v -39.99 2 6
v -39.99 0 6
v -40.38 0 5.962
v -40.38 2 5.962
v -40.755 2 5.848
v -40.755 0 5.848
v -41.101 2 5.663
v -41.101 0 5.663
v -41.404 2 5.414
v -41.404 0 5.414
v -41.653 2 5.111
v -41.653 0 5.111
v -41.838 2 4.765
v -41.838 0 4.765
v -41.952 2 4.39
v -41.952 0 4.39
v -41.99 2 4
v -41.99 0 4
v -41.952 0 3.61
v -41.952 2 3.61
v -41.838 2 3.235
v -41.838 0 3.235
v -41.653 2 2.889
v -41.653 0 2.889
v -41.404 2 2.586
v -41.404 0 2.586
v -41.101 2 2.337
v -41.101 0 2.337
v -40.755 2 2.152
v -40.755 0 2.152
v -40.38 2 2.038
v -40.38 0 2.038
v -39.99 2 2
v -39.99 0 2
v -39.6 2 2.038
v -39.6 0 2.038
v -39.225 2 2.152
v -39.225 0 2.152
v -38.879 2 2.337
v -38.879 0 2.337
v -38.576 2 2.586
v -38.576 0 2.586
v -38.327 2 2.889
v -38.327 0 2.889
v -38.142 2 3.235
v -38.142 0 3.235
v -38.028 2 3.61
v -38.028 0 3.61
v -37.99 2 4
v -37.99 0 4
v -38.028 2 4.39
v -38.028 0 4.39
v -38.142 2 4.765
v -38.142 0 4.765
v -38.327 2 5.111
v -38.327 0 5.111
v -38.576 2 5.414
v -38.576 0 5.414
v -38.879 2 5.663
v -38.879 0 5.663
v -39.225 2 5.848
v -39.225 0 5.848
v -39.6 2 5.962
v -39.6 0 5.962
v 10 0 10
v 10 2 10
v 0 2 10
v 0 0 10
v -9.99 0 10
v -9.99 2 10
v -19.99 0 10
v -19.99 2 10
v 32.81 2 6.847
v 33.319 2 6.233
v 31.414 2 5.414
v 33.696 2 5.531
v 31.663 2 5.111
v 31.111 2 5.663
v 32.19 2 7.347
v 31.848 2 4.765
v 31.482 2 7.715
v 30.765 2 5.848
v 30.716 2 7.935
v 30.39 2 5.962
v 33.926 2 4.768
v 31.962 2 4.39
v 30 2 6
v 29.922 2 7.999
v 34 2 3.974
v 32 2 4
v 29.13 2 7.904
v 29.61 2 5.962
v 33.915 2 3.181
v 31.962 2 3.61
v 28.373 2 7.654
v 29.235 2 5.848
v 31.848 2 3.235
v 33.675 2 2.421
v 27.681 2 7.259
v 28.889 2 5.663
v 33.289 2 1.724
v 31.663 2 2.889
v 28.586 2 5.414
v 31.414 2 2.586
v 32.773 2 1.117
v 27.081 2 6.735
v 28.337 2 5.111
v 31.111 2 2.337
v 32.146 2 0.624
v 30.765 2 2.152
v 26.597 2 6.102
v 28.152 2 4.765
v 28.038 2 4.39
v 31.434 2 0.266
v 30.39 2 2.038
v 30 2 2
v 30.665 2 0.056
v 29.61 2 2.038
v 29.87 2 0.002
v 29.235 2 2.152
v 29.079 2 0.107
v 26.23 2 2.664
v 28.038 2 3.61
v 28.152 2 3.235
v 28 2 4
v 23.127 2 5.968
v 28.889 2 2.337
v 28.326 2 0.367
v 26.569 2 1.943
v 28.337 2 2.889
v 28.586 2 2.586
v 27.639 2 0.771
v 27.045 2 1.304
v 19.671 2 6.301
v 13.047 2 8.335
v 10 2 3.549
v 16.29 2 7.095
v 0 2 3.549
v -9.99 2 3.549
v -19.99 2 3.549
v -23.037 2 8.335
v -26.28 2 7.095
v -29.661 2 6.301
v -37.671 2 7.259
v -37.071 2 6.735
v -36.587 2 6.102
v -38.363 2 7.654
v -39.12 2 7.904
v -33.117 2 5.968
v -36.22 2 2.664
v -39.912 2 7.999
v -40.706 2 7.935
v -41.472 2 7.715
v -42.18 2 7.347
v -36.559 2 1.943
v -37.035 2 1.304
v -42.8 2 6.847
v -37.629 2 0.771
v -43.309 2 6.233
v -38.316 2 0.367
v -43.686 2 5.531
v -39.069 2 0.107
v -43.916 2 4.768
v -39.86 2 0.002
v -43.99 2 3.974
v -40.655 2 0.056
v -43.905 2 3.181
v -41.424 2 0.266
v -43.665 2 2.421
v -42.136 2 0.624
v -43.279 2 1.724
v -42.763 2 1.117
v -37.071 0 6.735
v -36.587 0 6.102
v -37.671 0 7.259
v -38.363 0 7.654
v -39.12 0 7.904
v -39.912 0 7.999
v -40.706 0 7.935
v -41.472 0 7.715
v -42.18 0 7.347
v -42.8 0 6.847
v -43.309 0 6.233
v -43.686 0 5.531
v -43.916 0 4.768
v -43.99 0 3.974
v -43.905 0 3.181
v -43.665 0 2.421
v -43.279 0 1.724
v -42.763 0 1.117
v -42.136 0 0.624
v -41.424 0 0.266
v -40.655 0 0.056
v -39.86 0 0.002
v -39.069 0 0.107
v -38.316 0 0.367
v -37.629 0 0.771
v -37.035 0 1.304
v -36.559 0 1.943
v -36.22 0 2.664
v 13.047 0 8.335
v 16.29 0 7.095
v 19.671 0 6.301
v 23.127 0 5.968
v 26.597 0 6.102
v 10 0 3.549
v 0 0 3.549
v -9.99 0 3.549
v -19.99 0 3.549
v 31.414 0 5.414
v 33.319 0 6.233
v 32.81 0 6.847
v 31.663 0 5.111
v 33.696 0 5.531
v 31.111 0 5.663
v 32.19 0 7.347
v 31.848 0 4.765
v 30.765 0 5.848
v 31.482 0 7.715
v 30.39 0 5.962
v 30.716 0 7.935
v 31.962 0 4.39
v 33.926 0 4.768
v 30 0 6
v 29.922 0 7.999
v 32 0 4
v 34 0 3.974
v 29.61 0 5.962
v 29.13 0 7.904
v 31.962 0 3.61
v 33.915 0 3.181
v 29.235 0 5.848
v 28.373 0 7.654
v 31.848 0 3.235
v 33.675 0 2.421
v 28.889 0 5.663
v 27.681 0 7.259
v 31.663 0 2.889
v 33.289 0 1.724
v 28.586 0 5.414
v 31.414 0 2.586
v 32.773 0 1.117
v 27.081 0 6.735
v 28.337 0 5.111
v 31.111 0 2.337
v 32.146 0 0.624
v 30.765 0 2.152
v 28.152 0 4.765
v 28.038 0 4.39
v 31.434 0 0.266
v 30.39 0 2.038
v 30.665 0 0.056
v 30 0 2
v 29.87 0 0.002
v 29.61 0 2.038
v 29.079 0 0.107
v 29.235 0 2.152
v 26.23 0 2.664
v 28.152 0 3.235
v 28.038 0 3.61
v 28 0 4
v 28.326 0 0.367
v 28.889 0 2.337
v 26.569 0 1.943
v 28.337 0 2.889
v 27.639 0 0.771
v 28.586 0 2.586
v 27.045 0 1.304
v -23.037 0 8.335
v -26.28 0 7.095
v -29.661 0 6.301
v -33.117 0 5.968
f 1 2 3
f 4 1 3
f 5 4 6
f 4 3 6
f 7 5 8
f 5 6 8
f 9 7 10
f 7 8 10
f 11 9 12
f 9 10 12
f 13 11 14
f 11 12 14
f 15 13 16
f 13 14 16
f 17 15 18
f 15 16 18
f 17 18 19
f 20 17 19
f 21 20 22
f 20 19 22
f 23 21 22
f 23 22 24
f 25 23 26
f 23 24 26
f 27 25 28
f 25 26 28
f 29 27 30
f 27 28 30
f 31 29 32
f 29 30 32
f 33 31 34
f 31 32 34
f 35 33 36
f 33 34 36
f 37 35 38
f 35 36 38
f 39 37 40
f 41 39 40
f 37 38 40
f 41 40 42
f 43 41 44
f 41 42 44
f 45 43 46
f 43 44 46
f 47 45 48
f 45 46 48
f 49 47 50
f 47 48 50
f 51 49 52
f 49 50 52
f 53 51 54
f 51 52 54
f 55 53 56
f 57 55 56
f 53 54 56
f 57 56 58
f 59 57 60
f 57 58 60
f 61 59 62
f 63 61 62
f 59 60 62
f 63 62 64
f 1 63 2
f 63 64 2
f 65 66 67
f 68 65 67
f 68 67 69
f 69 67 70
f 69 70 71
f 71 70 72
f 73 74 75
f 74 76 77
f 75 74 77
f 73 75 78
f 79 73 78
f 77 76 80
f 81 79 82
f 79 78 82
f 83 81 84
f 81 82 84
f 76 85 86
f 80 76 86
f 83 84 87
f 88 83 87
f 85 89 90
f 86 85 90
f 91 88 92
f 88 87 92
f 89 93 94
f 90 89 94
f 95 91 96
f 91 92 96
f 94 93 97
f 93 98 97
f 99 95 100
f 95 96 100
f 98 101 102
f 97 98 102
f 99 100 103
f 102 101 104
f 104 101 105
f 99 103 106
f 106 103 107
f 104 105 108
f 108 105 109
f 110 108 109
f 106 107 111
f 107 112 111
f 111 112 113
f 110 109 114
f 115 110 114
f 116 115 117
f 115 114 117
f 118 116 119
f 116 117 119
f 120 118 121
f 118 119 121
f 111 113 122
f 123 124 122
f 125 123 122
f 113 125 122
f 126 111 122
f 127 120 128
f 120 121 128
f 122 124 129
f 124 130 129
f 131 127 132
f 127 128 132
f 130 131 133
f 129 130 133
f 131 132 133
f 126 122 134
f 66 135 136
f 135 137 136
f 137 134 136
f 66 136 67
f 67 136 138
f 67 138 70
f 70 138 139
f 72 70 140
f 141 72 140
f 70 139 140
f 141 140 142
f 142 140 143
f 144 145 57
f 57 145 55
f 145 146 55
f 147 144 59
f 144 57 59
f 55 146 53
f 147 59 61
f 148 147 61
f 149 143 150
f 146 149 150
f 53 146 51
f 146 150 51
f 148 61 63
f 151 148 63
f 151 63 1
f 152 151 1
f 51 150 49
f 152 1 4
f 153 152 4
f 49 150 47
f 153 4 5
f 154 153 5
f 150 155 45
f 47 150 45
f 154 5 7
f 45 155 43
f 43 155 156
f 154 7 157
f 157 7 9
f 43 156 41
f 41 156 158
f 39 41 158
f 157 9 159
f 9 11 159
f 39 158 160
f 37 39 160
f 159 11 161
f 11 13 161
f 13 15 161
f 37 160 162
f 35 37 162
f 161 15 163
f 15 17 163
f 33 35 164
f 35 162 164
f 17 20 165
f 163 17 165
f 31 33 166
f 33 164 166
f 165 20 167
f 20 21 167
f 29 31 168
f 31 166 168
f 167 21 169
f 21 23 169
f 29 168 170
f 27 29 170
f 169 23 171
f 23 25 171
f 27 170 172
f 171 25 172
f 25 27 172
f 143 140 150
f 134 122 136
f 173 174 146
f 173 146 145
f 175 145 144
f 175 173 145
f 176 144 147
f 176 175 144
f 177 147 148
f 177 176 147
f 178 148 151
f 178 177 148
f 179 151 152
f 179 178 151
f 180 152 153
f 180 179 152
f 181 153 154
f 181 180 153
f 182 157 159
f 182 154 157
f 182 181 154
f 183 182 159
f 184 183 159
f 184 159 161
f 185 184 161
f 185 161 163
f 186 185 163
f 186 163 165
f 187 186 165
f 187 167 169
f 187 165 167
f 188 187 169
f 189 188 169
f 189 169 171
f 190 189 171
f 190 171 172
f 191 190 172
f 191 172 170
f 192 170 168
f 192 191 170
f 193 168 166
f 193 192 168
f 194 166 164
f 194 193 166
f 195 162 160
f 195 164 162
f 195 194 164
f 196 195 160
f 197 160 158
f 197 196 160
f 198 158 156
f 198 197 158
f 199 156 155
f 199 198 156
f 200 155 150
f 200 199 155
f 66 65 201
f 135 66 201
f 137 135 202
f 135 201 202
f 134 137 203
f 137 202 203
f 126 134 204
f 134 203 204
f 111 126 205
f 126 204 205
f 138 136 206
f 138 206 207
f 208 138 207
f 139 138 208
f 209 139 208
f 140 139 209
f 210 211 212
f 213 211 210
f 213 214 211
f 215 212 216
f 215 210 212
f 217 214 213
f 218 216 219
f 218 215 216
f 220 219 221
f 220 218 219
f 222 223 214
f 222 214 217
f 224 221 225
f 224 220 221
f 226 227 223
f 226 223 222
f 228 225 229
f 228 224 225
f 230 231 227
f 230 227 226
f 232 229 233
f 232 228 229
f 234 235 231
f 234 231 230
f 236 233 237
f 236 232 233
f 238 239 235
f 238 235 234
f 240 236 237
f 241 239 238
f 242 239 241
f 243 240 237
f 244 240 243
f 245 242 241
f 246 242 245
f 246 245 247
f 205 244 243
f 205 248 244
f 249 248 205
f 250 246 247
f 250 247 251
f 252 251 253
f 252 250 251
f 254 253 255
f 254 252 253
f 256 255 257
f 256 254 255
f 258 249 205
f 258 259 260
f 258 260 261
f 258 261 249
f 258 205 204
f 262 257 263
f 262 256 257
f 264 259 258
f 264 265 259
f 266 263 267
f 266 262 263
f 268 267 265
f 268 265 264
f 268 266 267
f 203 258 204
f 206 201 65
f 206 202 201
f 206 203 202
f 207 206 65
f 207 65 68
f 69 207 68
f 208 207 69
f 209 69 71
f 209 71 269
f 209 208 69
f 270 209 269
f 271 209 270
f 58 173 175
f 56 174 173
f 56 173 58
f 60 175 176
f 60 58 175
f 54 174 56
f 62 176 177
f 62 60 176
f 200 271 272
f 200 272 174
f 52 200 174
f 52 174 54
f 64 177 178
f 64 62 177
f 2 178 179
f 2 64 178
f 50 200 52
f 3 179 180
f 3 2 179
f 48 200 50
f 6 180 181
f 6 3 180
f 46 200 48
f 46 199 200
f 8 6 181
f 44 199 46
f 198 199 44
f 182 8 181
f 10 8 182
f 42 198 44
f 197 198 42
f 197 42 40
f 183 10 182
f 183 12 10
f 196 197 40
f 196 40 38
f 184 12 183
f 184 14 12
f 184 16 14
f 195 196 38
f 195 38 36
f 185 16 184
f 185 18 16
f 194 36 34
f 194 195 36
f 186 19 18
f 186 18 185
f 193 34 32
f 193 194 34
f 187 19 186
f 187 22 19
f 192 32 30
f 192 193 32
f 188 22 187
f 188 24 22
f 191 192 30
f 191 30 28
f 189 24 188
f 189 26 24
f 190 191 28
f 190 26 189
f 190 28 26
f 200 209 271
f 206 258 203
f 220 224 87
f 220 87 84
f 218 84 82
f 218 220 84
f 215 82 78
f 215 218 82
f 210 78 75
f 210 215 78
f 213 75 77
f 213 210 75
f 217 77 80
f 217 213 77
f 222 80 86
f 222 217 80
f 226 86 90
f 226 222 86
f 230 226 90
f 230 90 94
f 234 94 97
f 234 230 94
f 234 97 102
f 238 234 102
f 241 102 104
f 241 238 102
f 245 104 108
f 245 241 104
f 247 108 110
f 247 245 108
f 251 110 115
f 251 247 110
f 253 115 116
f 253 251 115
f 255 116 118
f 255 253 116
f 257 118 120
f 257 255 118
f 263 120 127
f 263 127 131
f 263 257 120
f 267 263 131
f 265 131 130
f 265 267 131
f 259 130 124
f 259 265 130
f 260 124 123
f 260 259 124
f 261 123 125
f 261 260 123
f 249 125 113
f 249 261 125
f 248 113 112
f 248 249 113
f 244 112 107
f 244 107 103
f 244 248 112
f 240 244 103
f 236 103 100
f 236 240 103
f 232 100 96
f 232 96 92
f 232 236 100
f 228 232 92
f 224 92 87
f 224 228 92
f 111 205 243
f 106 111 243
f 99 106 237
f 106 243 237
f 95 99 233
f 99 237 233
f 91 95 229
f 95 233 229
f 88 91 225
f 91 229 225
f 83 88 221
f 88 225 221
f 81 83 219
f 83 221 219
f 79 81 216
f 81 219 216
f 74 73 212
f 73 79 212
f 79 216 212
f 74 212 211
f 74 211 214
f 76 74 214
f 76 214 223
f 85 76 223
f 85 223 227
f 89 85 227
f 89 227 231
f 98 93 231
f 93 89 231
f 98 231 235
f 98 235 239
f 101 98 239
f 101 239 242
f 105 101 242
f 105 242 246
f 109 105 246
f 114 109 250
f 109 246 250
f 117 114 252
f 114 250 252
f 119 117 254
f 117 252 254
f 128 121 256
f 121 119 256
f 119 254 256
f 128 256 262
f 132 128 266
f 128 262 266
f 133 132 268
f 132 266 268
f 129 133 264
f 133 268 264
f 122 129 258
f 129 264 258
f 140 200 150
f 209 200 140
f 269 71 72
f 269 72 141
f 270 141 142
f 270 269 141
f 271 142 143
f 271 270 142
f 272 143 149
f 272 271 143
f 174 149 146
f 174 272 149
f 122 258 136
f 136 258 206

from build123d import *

# Parameters (mm, degrees)
SKETCH1_R           = 4
SKETCH1_R_2         = 2
BOSS_EXTRUDE1_DEPTH = 2
SKETCH3_W           = 40.799195599
SKETCH3_H           = 10.791683918
CUT_EXTRUDE1_DEPTH  = 10
SKETCH4_W           = 4.995
SKETCH4_H           = 6.450932821
BOSS_EXTRUDE2_DEPTH = 2


with BuildPart() as part:
    # Sketch1 → Boss-Extrude1 (new body)
    # profile 1 of 3: a face of its own
    with BuildSketch(Plane(origin=(0, 0, 0), x_dir=(1, 0, 0), z_dir=(0, 1, 0))):
        with BuildLine():
            ThreePointArc((26.59659241, -6.101622416), (26.022594709, -4.424555239), (26.229666852, -2.664115292))
            Line((26.229666852, -2.664115292), (10, -3.549067179))
            Line((10, -3.549067179), (-10, -3.549067179))
            Line((-10, -3.549067179), (-26.229666852, -2.664115292))
            ThreePointArc((-26.229666852, -2.664115292), (-26.057834821, -3.32225838), (-26, -4))
            ThreePointArc((-26, -4), (-26.152037529, -5.092329996), (-26.59659241, -6.101622416))
            ThreePointArc((-26.59659241, -6.101622416), (-17.96712489, -6.640913059), (-10, -10))
            Line((-10, -10), (10, -10))
            ThreePointArc((10, -10), (17.96712489, -6.640913059), (26.59659241, -6.101622416))
        make_face()
    # profile 2 of 3: a face of its own
    with BuildSketch(Plane(origin=(0, 0, 0), x_dir=(1, 0, 0), z_dir=(0, 1, 0))):
        with Locations((-30, -4)):
            Circle(SKETCH1_R)
        with Locations(Location((-30, -4, 0), (0, 0, 270))):
            Circle(SKETCH1_R_2, mode=Mode.SUBTRACT)
    # profile 3 of 3: a face of its own
    with BuildSketch(Plane(origin=(0, 0, 0), x_dir=(1, 0, 0), z_dir=(0, 1, 0))):
        with Locations((30, -4)):
            Circle(SKETCH1_R)
        with Locations(Location((30, -4, 0), (0, 0, 270))):
            Circle(SKETCH1_R_2, mode=Mode.SUBTRACT)
    extrude(amount=BOSS_EXTRUDE1_DEPTH)

    # Sketch3 → Cut-Extrude1 (cut)
    with BuildSketch(Plane(origin=(0, 2, 0), x_dir=(1, 0, 0), z_dir=(0, 1, 0))):
        with Locations((-20.3995978, -4.604158041)):
            Rectangle(SKETCH3_W, SKETCH3_H)
    extrude(amount=-CUT_EXTRUDE1_DEPTH, mode=Mode.SUBTRACT)

    # Sketch4 → Boss-Extrude2 (add)
    with BuildSketch(Plane(origin=(0, 2, 0), x_dir=(1, 0, 0), z_dir=(0, 1, 0))):
        with Locations((-2.4975, -6.774533589)):
            Rectangle(SKETCH4_W, SKETCH4_H)
    extrude(amount=-BOSS_EXTRUDE2_DEPTH)

    # Mirror3: part across plane


with BuildPart() as part_1:
    add(part.part)
    add(part.part.mirror(Plane.ZY.offset(4.995)))


solid = part_1.part
